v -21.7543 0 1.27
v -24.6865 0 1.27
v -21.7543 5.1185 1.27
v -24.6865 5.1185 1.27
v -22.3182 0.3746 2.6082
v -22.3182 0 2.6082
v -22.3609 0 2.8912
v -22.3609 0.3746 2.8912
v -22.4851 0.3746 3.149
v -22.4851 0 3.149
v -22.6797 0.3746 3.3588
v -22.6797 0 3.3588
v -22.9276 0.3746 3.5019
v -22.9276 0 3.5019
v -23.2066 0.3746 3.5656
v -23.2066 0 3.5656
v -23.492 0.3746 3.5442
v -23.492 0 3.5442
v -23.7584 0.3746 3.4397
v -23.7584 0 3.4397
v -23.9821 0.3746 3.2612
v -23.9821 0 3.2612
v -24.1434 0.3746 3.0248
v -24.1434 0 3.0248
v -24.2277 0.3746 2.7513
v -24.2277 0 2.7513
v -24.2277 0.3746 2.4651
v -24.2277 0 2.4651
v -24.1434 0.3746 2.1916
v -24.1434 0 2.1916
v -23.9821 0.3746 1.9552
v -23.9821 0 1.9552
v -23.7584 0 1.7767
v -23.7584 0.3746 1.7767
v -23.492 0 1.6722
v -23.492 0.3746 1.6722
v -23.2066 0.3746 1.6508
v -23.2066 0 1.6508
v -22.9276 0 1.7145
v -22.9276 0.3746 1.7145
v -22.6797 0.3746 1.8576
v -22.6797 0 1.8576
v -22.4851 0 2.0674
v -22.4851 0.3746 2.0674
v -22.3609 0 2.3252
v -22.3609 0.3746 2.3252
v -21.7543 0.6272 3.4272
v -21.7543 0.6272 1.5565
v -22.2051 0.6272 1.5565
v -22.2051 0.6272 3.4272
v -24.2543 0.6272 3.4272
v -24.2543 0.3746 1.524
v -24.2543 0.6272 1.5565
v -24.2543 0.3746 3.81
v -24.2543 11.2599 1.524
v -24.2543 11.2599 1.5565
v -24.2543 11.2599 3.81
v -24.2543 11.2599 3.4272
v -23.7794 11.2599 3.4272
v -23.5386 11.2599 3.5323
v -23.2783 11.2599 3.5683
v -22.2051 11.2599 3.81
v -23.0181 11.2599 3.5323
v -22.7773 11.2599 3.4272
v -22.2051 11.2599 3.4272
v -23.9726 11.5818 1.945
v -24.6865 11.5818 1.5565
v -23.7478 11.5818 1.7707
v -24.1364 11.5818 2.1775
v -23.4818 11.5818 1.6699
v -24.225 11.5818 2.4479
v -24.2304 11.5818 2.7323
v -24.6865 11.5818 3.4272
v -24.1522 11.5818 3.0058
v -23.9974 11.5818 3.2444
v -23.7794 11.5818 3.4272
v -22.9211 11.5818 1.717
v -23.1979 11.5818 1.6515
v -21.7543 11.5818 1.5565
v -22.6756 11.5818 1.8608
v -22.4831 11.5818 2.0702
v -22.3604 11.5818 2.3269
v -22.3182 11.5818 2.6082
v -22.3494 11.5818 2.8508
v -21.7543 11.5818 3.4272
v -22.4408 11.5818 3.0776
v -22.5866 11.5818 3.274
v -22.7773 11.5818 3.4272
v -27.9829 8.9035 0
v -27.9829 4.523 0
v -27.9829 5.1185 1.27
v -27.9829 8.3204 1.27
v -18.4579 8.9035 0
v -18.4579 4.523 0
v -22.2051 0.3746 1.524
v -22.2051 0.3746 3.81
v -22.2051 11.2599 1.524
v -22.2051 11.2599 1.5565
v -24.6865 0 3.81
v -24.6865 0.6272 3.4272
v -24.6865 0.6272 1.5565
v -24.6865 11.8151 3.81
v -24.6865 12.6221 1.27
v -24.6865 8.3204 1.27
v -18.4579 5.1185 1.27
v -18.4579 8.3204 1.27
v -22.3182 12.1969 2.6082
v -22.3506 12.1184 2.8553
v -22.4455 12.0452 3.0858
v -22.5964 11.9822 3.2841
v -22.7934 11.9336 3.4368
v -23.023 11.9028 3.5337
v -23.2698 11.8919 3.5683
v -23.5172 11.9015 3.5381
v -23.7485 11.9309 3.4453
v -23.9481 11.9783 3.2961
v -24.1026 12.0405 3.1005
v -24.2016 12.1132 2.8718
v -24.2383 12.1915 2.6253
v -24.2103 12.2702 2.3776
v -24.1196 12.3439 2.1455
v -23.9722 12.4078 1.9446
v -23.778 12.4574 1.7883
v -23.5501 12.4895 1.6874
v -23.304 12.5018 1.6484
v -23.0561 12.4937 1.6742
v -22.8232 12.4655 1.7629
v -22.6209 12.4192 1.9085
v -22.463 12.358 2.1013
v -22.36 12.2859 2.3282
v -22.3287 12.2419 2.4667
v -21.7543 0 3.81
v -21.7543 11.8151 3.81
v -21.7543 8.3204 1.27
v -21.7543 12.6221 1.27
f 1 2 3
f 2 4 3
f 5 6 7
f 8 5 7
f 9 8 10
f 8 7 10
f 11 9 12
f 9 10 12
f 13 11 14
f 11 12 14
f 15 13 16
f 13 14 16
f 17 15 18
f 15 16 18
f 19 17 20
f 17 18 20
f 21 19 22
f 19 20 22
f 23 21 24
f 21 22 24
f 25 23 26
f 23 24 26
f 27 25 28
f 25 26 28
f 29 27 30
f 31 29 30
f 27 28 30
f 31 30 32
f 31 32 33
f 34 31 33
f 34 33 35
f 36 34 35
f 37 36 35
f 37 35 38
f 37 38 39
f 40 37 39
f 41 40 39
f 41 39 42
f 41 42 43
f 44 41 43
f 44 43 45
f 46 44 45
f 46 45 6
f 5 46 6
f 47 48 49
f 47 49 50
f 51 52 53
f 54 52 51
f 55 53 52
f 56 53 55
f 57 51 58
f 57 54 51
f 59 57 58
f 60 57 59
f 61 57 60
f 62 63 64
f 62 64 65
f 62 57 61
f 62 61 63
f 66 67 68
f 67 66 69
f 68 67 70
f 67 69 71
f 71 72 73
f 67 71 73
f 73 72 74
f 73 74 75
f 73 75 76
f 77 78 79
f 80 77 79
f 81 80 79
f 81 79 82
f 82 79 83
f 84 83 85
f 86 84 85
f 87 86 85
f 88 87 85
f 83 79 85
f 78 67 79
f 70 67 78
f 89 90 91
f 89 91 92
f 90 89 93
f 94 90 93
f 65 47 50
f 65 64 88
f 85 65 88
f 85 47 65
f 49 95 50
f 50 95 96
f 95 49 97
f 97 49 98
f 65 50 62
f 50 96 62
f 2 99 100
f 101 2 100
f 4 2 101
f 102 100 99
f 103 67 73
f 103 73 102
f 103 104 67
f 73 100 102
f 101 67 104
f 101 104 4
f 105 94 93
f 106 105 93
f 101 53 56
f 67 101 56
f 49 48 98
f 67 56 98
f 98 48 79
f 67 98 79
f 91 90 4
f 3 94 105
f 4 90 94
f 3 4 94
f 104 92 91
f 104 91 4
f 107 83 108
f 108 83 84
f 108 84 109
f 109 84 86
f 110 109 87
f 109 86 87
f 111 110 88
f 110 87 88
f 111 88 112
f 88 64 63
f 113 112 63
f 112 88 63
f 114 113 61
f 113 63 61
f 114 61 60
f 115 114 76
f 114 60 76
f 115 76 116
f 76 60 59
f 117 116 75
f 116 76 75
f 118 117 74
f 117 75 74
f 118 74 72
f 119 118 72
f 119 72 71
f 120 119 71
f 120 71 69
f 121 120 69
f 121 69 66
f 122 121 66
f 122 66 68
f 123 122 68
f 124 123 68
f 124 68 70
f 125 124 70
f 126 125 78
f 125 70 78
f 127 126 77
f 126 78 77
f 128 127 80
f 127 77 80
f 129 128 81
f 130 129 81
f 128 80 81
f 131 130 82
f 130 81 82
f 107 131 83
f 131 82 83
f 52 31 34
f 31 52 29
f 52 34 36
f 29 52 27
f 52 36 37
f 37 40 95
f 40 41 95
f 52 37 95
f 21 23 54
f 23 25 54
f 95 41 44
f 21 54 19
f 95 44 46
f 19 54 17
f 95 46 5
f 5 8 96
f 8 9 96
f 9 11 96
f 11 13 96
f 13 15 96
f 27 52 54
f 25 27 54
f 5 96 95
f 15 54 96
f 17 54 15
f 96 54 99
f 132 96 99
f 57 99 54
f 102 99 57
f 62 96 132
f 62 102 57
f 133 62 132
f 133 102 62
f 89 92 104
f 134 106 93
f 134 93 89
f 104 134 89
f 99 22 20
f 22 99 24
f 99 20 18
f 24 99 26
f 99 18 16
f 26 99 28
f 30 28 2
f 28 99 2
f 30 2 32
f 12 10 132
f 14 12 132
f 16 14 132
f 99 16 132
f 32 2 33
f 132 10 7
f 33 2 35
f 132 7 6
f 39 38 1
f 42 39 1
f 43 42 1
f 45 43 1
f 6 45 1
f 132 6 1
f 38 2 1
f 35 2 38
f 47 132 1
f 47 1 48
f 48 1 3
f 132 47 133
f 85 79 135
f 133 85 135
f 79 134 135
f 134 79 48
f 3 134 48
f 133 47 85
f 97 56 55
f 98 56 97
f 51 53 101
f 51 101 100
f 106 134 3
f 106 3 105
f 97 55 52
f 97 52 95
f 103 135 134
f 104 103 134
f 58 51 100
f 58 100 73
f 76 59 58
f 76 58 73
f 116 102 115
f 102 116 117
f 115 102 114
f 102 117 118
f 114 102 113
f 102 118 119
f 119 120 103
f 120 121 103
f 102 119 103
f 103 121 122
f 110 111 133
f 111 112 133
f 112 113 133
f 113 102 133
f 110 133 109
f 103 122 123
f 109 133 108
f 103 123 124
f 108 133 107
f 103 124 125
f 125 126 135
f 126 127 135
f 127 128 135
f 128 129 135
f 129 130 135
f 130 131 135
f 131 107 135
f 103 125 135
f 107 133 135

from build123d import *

# Parameters (mm, degrees)
F0_W      = 9.525
F0_H      = 4.380480709
F1_DEPTH  = 1.27
F2_W      = 2.9321946495
F2_H      = 12.622077018
F3_DEPTH  = 2.54
F6_DEPTH  = 25.4
F8_DEPTH  = 25.4
F9_R      = 0.9600996903
F10_DEPTH = 25.4
F11_W     = 2.0492244512
F11_H     = 10.8852496778
F12_DEPTH = 2.286
F13_W     = 10.9546062886
F13_H     = 1.8707374111
F14_DEPTH = 25.4


with BuildPart() as f1:
    # F0 (on Top) → F1 (new body)
    with BuildSketch(Plane.XY):
        with Locations((-23.2204422355, 6.7132576369)):
            Rectangle(F0_W, F0_H)
    extrude(amount=F1_DEPTH)

    # F2 (on face) → F3 (join)
    with BuildSketch(Plane.XY.offset(1.27)):
        with Locations((-23.2204422355, 6.311038509)):
            Rectangle(F2_W, F2_H)
    extrude(amount=F3_DEPTH)

    # F5 (on face) → F6 (cut)
    with BuildSketch(Plane.YZ.offset(-18.4579422355)):
        Polygon((4.5230172824, 1.27), (4.5230172824, 0), (5.1185246557, 1.27), align=None)
        Polygon((8.3203641698, 1.27), (8.9034979914, 0), (8.9034979914, 1.27), align=None)
    extrude(amount=-F6_DEPTH, mode=Mode.SUBTRACT)

    # F7 (on face) → F8 (cut)
    with BuildSketch(Plane.YZ.offset(-21.7543449107)):
        Polygon((11.8150692433, 3.81), (12.622077018, 1.27), (12.622077018, 3.81), align=None)
    extrude(amount=-F8_DEPTH, mode=Mode.SUBTRACT)

    # F9 (on face) → F10 (cut)
    with BuildSketch(Plane.XZ):
        with Locations((-23.2783449107, 2.6081991382)):
            Circle(F9_R)
    extrude(amount=-F10_DEPTH, mode=Mode.SUBTRACT)

    # F11 (on face) → F12 (cut)
    with BuildSketch(Plane.XY.offset(3.81)):
        with Locations((-23.2297061011, 5.8172373829)):
            Rectangle(F11_W, F11_H)
    extrude(amount=-F12_DEPTH, mode=Mode.SUBTRACT)

    # F13 (on face) → F14 (cut)
    with BuildSketch(Plane.YZ.offset(-21.7543449107)):
        with Locations((6.1044846952, 2.4918210693)):
            Rectangle(F13_W, F13_H)
    extrude(amount=-F14_DEPTH, mode=Mode.SUBTRACT)


solid = f1.part
